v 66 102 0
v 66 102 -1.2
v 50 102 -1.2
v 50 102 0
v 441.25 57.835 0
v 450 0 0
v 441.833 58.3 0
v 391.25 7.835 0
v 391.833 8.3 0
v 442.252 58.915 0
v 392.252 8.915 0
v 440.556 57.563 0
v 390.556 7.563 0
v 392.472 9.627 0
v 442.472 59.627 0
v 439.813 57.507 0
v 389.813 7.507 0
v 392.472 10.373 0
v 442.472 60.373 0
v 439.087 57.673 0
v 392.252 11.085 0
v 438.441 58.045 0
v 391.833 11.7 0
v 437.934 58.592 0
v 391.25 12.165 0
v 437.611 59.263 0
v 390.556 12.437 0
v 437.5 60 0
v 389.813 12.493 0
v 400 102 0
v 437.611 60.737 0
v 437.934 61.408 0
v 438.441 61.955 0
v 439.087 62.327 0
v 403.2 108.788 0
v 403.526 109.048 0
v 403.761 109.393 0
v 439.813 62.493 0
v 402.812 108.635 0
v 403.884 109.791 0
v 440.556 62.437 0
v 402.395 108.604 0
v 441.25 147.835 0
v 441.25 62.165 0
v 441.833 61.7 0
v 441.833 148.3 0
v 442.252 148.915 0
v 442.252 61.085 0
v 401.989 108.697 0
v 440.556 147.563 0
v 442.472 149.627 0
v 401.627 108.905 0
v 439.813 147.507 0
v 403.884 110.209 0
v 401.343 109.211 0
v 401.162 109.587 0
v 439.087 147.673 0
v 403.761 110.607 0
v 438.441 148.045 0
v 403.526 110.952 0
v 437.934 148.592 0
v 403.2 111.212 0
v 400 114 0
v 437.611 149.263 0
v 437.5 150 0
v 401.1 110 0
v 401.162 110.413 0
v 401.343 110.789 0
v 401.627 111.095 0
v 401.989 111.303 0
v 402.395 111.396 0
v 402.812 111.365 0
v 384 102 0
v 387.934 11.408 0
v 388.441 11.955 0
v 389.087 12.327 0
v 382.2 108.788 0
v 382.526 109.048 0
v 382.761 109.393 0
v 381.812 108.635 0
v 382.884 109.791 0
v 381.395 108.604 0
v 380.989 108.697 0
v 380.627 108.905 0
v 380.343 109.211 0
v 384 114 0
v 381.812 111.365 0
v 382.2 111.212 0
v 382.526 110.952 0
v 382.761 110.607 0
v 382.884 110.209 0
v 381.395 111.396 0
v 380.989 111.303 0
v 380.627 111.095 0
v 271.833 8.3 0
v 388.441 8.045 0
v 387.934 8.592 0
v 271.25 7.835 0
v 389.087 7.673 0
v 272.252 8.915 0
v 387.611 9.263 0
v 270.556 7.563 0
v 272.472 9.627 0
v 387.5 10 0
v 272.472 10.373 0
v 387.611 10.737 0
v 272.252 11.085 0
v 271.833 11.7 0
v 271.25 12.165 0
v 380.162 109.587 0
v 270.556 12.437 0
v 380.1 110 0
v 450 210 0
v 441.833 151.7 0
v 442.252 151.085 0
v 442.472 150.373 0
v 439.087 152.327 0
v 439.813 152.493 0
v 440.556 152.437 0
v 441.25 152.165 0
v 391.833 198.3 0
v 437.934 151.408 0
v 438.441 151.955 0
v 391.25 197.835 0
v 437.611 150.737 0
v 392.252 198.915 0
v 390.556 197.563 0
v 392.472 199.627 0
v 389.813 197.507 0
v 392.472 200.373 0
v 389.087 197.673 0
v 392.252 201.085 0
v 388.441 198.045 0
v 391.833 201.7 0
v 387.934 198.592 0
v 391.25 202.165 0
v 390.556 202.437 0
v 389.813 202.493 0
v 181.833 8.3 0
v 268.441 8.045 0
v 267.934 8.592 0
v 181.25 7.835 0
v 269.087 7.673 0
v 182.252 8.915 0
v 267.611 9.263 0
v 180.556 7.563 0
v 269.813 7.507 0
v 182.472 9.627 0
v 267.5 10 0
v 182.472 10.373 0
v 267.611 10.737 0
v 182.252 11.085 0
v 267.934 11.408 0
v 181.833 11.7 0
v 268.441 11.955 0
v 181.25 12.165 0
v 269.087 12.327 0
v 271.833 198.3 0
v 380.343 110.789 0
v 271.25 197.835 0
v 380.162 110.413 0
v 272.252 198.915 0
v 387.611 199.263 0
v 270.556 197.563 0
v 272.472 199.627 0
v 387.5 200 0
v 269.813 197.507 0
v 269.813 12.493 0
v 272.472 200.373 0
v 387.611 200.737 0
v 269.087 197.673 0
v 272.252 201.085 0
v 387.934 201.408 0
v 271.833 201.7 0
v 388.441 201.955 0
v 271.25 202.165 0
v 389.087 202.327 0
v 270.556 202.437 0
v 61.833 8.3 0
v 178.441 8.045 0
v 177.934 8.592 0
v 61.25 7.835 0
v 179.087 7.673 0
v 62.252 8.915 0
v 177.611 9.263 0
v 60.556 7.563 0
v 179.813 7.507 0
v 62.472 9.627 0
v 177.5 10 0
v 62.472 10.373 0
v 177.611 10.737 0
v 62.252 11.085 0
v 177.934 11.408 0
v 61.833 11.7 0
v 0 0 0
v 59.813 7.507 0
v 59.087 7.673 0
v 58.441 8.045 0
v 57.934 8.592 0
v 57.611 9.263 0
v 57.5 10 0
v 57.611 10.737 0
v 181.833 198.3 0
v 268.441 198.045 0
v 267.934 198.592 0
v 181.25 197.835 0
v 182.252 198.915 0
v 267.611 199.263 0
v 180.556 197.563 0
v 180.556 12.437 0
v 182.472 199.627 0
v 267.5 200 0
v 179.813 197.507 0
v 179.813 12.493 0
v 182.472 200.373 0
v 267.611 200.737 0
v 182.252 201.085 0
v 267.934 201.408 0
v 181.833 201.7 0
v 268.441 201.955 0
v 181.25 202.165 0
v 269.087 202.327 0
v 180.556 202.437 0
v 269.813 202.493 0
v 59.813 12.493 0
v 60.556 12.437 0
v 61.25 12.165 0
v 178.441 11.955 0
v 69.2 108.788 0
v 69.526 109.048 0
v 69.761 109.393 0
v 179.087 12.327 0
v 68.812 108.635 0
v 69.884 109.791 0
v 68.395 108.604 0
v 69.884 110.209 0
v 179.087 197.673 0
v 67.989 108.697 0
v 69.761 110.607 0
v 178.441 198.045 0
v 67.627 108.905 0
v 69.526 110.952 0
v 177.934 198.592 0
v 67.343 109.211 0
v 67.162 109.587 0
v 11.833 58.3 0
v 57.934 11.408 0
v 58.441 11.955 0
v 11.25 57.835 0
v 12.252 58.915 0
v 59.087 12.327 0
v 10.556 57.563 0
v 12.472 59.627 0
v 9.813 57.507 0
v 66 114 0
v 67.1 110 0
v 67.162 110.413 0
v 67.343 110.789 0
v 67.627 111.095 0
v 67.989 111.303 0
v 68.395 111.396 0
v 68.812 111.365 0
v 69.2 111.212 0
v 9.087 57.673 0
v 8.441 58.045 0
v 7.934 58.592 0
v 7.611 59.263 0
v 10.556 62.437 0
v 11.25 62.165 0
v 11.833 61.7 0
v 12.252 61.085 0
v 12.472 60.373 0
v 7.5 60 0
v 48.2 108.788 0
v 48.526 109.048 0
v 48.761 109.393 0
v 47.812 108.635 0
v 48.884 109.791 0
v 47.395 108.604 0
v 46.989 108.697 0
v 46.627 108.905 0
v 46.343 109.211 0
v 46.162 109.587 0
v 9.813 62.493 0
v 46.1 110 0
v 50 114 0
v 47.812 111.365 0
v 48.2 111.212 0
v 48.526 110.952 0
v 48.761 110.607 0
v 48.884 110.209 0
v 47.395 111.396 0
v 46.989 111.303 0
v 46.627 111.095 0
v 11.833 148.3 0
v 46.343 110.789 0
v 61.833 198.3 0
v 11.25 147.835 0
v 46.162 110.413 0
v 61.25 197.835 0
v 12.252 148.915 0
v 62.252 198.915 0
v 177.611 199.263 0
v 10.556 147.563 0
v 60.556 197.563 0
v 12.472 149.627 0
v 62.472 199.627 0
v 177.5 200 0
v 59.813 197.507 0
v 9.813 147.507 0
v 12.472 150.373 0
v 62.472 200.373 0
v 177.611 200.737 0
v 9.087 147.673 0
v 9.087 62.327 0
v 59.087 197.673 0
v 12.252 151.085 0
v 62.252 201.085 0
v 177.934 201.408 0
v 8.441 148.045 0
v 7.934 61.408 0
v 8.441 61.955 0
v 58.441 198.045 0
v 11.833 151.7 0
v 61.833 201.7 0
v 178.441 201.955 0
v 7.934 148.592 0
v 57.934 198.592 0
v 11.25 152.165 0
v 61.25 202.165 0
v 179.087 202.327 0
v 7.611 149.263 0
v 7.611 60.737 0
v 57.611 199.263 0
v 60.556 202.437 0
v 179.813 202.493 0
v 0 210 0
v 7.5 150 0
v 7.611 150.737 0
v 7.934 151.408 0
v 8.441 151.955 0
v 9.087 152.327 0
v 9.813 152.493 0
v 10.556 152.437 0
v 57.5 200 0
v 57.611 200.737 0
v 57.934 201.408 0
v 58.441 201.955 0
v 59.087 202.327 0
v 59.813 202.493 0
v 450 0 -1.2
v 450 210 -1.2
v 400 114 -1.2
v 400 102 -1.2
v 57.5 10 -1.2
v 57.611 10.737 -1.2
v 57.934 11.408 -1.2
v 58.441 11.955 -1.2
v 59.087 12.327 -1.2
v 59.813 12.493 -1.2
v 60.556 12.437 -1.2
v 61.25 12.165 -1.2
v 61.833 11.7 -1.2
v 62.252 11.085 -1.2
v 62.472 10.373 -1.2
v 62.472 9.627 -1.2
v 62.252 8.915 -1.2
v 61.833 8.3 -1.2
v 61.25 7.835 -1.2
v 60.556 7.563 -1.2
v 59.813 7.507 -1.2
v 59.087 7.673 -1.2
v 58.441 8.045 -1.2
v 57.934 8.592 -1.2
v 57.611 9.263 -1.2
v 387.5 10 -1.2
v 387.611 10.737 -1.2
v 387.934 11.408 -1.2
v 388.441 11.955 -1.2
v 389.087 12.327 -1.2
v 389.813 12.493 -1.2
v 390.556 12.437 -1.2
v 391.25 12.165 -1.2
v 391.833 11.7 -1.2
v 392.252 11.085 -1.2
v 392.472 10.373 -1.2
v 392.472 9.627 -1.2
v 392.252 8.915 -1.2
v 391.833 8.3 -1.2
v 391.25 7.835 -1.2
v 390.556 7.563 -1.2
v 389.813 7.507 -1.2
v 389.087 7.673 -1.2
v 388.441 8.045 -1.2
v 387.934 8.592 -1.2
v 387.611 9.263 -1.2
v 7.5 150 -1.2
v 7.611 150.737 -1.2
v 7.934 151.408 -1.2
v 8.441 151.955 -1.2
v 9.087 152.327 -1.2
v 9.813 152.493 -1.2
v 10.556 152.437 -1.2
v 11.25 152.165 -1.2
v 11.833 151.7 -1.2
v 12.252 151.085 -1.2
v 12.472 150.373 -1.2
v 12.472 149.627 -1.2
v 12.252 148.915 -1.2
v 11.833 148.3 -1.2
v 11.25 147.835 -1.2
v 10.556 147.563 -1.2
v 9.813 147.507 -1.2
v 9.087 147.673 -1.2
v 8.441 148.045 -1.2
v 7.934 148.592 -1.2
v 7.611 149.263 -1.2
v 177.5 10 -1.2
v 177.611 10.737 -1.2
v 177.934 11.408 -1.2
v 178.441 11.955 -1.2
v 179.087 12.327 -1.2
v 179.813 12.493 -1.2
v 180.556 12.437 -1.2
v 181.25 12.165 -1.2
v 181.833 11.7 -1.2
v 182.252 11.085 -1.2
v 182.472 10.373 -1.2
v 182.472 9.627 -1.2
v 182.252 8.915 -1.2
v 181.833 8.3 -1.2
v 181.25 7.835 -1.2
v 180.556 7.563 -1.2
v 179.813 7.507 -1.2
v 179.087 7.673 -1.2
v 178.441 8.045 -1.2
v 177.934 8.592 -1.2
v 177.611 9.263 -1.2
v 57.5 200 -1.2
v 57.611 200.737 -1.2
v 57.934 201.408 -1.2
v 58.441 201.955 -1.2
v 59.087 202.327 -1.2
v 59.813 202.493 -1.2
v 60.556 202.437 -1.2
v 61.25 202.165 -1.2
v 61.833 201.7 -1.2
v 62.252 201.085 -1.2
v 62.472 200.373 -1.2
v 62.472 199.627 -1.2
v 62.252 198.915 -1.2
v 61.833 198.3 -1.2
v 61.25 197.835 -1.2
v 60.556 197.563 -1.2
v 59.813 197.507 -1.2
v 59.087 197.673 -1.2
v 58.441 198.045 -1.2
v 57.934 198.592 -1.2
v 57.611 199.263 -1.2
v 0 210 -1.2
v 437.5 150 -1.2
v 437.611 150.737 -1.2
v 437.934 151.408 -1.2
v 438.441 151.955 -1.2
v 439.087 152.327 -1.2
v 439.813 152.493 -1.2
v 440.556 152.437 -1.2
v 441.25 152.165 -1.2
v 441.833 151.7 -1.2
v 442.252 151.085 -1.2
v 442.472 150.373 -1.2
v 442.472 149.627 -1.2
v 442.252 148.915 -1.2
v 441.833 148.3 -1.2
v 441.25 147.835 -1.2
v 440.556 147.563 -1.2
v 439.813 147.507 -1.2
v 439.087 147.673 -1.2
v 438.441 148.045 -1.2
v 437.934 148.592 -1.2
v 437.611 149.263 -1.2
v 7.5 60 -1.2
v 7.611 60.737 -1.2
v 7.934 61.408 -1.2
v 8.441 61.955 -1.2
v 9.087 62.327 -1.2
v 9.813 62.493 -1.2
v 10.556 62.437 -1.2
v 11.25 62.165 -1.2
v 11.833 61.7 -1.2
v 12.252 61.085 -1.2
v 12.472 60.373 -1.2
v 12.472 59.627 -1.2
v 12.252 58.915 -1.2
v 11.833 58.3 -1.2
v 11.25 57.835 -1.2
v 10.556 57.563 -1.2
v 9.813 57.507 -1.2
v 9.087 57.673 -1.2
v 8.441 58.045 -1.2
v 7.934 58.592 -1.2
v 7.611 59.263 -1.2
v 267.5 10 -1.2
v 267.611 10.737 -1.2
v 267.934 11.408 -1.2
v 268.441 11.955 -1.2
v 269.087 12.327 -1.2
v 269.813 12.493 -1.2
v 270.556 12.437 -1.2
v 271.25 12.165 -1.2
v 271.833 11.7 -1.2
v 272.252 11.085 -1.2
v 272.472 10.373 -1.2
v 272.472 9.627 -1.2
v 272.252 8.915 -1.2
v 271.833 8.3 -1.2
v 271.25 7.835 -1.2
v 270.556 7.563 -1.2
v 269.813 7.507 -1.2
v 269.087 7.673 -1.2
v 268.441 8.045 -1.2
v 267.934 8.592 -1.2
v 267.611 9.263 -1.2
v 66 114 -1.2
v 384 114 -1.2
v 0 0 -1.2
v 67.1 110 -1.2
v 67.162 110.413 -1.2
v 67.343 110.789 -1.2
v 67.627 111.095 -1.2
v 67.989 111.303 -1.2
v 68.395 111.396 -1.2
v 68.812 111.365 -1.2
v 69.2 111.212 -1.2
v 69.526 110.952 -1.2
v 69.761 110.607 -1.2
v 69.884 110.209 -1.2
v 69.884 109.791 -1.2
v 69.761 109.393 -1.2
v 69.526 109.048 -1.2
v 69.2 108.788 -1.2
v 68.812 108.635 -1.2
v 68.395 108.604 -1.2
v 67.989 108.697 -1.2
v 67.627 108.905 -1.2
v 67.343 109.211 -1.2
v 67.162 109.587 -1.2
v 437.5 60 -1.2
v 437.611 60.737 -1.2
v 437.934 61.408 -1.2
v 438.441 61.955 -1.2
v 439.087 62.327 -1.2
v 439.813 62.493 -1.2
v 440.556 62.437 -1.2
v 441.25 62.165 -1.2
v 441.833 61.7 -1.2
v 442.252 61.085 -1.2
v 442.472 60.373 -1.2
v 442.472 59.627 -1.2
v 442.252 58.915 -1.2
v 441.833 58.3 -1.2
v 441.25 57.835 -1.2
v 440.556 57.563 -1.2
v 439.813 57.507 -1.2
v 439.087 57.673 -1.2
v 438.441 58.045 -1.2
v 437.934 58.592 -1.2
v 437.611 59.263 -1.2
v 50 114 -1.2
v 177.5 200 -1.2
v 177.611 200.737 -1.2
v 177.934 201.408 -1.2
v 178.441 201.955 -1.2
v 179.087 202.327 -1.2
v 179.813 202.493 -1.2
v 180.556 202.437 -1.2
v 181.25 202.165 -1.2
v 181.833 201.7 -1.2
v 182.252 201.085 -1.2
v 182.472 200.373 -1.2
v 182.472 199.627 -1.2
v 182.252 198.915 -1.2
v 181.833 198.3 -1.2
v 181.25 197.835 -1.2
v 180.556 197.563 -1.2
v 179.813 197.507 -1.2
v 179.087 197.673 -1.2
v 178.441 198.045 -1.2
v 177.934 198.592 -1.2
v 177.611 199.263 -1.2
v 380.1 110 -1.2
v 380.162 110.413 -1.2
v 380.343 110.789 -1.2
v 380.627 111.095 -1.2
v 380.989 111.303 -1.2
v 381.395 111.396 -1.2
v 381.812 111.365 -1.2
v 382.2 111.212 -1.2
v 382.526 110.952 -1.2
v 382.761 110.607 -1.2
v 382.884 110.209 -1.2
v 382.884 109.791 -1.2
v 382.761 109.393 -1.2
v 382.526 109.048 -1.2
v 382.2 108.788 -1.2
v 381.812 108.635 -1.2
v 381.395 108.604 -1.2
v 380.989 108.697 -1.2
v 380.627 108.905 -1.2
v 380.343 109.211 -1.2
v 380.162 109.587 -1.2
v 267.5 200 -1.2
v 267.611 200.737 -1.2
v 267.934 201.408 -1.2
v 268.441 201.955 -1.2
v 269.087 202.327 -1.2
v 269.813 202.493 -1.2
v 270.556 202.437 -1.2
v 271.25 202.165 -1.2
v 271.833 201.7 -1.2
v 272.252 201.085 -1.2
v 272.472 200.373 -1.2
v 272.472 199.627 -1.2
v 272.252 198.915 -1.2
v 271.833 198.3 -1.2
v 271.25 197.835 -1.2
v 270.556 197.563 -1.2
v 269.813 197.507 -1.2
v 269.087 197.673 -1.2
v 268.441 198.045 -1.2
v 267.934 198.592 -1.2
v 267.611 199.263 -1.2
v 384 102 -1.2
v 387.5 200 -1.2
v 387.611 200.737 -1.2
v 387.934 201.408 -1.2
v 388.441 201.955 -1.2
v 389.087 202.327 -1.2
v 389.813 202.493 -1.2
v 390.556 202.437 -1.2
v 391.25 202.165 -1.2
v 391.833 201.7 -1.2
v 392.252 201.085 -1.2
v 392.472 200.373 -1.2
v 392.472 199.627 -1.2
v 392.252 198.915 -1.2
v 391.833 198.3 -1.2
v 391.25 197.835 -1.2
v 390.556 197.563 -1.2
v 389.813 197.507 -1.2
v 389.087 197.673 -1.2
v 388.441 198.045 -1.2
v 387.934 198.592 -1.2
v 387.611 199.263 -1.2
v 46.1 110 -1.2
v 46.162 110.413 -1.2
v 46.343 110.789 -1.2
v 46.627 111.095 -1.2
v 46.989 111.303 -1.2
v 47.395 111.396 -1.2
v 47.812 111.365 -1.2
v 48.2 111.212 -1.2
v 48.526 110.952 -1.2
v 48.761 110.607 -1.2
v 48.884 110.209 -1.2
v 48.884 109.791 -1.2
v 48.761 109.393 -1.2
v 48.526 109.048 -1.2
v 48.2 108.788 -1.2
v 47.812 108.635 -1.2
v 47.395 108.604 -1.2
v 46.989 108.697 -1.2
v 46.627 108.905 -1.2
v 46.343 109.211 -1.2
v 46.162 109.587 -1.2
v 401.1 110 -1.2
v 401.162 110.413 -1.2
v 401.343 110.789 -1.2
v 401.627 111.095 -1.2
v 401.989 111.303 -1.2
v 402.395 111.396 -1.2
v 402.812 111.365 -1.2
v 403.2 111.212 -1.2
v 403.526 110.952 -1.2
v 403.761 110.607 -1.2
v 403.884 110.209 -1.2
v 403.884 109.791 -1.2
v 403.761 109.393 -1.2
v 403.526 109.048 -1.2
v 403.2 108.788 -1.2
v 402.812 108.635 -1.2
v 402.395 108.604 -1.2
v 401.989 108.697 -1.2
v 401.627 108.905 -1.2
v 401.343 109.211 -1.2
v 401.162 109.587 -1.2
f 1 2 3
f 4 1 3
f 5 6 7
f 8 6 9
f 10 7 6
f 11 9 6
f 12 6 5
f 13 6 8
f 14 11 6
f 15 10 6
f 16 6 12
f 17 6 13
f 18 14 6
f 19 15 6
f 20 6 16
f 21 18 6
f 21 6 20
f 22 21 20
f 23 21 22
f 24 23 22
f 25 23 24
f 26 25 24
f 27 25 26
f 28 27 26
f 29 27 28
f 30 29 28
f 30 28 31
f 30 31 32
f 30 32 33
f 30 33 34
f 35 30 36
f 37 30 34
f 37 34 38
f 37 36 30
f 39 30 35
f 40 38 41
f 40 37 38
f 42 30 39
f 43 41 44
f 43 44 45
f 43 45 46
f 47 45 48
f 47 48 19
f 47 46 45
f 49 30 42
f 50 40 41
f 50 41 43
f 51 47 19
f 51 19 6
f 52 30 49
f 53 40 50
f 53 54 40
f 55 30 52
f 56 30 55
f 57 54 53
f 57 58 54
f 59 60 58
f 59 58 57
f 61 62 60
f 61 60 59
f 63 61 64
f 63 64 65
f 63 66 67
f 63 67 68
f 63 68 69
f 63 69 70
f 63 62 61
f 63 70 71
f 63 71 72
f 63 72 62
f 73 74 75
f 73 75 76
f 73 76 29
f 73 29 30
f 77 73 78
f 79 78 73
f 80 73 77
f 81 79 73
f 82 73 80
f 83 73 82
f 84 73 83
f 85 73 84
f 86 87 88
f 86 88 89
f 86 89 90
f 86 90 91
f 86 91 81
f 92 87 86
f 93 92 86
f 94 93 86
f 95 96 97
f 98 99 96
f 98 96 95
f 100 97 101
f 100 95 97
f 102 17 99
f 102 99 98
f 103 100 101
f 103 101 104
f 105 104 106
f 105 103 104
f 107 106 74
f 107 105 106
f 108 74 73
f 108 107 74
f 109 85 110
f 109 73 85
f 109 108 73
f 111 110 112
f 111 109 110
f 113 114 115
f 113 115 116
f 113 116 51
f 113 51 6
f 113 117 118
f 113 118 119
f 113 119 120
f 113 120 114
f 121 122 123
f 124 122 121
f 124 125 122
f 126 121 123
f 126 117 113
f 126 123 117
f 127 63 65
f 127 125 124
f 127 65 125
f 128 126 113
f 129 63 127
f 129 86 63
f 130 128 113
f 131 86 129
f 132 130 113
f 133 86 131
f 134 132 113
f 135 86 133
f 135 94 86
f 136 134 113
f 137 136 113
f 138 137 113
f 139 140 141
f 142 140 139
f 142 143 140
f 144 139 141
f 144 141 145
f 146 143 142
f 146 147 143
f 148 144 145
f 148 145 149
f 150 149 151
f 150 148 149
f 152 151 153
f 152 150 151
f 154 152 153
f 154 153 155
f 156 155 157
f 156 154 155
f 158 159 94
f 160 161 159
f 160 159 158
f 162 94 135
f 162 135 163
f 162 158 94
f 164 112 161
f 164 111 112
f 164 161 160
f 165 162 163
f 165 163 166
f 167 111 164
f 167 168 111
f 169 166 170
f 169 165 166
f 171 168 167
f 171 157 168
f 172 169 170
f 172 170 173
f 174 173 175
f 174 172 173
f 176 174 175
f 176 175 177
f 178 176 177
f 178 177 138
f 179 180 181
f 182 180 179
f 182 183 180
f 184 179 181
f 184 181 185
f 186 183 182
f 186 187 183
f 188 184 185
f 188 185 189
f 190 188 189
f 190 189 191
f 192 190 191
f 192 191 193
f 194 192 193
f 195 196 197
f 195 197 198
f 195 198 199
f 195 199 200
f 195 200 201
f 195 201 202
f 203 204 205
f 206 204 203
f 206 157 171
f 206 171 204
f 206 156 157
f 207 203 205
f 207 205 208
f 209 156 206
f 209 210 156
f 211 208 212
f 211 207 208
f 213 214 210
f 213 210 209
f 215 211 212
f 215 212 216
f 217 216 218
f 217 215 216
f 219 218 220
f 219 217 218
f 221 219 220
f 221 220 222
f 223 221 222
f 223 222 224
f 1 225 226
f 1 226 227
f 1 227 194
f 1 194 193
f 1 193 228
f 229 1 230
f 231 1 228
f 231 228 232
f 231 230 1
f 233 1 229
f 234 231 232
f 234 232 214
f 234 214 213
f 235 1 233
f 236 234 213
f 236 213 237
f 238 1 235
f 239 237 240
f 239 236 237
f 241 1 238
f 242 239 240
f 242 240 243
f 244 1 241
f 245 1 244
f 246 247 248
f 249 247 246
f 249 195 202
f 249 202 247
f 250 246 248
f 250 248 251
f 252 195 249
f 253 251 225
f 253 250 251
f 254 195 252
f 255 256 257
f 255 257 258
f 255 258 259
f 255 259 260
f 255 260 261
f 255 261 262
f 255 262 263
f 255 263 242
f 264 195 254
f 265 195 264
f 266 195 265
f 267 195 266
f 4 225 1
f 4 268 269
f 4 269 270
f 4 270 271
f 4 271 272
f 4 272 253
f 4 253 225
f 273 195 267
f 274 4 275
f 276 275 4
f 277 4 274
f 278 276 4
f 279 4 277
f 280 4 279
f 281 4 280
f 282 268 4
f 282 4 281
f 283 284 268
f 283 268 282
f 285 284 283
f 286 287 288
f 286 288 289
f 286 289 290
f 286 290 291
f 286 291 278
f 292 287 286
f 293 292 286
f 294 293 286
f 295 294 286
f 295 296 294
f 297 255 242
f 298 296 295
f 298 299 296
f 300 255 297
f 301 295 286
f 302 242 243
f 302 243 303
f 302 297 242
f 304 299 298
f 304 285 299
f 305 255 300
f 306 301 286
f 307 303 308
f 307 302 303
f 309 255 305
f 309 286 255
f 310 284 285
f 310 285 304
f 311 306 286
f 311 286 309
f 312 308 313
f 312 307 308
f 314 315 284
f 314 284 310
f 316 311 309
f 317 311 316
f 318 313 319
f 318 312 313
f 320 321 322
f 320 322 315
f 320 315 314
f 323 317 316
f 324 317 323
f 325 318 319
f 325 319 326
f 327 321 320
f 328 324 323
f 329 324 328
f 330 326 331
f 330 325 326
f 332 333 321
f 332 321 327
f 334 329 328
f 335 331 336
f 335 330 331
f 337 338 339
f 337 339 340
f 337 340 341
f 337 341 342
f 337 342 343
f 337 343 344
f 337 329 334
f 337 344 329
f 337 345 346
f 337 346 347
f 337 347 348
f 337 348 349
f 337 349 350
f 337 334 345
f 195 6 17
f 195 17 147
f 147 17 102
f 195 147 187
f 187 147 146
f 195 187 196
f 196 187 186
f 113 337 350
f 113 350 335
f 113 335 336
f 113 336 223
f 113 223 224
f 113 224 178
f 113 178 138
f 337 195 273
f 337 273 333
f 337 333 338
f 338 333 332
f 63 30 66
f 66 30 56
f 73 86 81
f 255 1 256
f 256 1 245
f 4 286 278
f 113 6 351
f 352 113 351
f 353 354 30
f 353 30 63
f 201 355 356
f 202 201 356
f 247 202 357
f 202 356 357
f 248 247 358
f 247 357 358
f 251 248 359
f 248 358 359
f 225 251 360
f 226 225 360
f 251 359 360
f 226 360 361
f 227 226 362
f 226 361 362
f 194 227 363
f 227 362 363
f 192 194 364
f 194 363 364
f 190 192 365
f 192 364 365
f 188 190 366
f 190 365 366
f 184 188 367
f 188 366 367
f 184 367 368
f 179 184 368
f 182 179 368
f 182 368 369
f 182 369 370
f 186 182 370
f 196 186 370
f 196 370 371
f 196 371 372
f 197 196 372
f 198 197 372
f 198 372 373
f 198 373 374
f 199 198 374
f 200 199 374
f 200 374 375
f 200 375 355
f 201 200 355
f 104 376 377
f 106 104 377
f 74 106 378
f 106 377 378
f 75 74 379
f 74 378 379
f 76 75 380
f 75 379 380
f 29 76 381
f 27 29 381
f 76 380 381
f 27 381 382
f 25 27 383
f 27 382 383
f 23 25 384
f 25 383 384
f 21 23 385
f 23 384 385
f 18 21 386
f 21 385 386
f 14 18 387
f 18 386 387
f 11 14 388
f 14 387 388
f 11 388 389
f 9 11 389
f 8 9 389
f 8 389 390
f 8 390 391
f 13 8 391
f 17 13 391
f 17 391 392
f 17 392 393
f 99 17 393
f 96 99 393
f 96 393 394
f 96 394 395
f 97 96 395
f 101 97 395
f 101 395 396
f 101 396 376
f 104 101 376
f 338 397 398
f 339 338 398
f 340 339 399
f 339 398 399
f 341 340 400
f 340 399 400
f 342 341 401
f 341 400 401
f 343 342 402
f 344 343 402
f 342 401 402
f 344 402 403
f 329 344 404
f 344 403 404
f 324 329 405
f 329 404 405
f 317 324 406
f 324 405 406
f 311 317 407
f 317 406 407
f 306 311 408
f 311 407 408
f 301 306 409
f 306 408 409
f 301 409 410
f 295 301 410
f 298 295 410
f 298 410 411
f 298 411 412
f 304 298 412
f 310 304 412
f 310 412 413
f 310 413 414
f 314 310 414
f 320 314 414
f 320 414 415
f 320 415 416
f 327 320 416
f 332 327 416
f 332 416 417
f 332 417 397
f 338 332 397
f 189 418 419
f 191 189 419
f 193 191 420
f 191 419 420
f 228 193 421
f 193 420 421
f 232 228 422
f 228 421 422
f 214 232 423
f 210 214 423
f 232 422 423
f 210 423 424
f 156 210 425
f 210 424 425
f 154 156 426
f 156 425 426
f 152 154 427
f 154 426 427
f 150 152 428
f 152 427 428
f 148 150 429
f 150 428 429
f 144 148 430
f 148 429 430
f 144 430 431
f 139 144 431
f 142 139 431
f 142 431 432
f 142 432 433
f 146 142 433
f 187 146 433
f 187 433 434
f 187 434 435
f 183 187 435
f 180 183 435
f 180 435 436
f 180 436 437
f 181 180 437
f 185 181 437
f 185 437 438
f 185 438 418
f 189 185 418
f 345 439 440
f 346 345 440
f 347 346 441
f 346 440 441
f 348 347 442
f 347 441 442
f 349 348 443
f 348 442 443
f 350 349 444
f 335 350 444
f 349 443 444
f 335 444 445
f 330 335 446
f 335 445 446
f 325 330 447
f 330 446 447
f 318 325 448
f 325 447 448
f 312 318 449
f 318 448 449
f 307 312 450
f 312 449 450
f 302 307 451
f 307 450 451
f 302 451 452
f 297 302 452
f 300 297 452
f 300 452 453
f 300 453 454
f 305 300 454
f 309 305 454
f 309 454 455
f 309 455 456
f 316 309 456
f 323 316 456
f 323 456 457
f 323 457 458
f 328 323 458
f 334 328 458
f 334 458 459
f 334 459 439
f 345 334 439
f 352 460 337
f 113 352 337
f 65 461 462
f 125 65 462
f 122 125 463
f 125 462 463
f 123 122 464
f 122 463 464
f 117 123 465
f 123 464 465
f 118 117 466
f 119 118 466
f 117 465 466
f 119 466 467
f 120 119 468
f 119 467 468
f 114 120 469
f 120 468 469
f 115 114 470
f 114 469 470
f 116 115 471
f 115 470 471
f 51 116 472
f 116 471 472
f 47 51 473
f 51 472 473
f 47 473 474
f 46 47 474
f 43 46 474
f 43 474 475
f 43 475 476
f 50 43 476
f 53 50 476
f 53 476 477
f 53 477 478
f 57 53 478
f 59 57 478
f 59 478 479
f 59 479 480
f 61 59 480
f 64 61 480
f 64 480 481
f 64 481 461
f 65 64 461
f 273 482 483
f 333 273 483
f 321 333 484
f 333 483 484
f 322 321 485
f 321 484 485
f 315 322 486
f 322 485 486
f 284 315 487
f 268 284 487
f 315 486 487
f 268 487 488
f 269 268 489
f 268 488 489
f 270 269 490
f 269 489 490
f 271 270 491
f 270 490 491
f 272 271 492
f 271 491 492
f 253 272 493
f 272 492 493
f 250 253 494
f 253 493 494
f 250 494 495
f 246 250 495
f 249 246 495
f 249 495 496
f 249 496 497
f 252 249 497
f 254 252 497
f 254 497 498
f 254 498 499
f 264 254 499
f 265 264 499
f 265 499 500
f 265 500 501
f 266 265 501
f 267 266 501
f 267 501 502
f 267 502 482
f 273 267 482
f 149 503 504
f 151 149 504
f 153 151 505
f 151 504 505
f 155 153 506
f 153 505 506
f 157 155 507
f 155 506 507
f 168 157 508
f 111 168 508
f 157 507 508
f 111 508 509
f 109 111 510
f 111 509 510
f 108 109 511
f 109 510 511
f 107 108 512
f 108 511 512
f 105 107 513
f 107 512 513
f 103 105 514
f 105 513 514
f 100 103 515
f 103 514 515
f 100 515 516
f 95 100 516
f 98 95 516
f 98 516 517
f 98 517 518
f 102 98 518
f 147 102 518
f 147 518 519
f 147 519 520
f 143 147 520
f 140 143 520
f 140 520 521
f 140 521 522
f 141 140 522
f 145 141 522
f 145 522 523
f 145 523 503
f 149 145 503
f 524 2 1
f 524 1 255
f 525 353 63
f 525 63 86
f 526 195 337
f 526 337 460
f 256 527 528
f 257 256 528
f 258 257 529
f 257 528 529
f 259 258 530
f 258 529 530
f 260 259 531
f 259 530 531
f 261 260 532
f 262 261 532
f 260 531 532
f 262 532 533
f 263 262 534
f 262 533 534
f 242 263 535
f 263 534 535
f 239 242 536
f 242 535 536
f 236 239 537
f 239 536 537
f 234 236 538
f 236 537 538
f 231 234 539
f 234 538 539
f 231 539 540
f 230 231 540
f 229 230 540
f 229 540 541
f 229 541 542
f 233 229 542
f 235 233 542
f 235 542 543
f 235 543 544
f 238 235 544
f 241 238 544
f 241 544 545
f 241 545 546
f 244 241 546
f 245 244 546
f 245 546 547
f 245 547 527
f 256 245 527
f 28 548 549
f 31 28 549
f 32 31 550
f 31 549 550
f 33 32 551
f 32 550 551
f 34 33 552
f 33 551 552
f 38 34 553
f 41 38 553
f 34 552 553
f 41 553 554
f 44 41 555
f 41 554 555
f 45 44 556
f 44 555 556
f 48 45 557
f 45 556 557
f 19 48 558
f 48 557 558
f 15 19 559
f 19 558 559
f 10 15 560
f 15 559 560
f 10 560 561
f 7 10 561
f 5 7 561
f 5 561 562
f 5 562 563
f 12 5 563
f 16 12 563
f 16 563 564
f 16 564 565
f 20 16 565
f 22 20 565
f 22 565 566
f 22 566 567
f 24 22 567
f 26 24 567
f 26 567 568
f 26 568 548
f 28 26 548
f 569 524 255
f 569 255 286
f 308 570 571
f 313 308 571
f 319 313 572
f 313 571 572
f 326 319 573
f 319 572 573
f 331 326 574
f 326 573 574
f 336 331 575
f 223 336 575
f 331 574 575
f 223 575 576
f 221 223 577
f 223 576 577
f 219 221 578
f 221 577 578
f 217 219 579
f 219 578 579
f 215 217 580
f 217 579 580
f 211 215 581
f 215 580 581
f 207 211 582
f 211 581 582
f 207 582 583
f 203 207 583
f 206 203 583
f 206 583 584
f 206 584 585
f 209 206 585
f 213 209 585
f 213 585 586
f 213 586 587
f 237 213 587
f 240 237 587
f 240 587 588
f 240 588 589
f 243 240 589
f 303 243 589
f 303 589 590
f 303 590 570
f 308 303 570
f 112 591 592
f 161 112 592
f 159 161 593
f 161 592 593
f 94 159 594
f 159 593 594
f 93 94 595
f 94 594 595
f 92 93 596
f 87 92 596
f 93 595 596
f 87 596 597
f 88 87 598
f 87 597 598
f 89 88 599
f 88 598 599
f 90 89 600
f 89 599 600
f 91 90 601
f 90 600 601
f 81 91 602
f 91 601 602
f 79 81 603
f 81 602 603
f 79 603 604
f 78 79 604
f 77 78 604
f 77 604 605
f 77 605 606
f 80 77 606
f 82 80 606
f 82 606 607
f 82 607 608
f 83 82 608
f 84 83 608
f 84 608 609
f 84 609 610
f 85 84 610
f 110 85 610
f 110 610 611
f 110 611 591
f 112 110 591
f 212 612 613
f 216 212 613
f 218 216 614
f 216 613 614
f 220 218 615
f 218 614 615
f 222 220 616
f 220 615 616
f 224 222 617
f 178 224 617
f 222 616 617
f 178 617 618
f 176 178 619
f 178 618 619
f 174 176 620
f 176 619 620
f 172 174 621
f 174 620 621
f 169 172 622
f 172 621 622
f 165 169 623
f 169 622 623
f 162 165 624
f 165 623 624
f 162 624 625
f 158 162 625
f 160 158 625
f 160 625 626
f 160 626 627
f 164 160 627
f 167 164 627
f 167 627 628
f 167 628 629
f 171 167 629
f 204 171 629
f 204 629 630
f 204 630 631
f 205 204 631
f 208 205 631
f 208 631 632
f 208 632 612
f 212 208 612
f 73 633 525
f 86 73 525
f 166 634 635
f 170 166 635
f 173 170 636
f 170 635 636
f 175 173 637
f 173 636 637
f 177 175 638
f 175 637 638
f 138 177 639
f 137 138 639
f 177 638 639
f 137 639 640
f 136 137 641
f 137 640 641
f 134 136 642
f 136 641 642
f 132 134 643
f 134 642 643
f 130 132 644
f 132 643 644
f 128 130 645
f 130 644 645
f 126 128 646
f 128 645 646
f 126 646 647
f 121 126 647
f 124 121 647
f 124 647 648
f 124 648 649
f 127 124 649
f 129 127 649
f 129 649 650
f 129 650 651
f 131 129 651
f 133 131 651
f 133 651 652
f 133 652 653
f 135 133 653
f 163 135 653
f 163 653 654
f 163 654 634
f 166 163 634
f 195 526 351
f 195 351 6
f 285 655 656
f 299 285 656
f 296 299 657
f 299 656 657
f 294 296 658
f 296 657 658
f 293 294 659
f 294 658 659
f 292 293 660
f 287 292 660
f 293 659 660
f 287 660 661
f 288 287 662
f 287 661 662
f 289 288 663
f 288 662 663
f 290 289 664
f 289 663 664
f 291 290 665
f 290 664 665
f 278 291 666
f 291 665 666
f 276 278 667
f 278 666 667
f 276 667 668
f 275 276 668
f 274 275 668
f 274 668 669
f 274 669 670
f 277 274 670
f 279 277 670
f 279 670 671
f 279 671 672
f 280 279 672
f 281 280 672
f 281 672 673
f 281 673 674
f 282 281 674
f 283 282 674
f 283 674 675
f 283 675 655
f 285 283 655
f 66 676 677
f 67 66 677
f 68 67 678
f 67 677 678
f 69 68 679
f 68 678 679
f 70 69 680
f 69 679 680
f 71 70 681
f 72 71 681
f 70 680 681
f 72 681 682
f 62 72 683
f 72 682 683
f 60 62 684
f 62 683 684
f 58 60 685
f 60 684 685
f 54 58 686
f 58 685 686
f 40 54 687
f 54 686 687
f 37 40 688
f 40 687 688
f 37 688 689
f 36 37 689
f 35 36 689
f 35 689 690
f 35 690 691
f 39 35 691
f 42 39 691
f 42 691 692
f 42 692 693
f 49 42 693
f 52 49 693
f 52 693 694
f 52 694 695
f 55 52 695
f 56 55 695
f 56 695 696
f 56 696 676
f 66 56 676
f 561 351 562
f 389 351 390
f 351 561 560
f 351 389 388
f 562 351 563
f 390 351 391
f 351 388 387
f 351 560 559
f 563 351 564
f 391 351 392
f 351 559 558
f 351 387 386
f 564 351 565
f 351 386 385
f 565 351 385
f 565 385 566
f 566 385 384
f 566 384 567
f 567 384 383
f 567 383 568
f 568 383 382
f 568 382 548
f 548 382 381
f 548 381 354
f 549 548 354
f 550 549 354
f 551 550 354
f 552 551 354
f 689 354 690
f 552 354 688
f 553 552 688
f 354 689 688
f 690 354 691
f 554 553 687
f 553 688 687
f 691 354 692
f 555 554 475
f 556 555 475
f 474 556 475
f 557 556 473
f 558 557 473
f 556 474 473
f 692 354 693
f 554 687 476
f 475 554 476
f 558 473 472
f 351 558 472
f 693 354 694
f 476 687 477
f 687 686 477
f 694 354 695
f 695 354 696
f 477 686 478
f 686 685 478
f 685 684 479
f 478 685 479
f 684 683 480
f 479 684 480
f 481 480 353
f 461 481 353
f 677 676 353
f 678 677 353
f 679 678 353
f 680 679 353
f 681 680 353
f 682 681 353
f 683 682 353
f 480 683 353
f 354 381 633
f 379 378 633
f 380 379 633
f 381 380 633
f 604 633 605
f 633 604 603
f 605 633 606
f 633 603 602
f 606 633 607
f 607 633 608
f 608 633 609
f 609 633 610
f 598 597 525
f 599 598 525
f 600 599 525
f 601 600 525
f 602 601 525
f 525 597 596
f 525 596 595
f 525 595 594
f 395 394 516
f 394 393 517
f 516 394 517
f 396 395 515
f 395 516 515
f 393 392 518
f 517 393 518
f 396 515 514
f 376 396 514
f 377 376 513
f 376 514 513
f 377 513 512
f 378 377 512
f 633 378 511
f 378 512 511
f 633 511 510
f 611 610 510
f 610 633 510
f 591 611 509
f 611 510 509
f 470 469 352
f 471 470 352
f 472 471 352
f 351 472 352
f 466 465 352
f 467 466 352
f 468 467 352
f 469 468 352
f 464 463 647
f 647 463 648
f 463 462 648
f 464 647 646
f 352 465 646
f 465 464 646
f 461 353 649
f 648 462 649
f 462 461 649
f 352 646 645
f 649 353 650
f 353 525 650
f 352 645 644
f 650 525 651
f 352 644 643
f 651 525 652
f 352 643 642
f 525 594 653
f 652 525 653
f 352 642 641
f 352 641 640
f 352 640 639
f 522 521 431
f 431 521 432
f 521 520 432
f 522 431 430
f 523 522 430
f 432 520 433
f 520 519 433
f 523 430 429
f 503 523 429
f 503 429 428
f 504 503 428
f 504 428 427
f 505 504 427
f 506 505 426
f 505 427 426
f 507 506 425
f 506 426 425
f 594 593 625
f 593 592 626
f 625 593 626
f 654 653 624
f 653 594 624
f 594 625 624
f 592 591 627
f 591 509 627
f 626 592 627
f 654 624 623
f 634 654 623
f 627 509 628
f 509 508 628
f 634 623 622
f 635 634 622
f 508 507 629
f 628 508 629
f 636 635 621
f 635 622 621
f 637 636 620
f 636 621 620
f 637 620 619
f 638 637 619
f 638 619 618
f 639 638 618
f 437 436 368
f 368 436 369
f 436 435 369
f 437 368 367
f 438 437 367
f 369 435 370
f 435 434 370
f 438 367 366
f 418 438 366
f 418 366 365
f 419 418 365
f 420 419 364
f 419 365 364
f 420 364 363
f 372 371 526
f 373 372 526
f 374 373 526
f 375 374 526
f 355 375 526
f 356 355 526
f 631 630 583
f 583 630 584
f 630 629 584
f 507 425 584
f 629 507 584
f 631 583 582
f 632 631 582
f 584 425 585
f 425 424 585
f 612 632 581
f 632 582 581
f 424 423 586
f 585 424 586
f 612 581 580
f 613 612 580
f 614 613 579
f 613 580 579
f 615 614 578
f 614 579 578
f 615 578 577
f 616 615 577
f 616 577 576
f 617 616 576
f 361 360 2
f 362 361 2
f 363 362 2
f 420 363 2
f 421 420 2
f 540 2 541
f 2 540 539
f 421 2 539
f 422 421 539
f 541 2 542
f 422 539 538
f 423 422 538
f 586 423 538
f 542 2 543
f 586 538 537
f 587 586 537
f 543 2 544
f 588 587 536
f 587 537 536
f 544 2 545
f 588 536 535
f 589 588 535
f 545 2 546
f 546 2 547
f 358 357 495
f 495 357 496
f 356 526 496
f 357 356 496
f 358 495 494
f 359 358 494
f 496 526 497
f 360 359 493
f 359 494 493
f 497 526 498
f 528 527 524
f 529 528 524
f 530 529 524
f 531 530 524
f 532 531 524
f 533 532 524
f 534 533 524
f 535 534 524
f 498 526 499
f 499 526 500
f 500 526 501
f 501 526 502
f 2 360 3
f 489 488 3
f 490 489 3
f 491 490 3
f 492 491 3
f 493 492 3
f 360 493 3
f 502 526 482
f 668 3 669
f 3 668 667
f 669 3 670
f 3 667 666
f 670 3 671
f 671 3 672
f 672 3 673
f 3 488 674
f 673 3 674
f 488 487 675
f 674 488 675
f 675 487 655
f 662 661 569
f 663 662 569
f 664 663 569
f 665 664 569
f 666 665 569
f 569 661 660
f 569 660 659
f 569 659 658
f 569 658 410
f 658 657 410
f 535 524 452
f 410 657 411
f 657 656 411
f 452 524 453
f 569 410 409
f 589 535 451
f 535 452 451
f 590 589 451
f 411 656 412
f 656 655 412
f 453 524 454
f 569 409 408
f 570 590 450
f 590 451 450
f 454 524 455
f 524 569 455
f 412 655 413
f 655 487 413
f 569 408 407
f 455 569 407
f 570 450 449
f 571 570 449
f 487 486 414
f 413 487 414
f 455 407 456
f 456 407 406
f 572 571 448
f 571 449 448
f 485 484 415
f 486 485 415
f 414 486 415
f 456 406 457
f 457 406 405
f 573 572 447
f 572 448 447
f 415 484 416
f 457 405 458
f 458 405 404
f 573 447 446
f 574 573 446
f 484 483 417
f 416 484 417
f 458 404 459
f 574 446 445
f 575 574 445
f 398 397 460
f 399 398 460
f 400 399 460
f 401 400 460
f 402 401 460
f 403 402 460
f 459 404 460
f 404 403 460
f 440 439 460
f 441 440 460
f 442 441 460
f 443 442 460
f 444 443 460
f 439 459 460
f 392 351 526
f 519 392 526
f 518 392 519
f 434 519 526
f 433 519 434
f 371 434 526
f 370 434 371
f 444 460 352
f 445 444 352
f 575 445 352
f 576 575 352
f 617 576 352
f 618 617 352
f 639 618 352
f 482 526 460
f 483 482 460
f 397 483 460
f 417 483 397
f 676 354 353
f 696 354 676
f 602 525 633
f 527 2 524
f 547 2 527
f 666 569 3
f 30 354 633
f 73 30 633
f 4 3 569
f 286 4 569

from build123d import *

# Parameters (mm, degrees)
SURFACE_EXTRUDE1_1_DEPTH = 450
THICKEN15_T2             = 1.2
SKETCH2_W                = 16
SKETCH2_H                = 12
CUT_EXTRUDE1_DEPTH       = 10
SKETCH3_R                = 1.4
CUT_EXTRUDE2_DEPTH       = 10
SKETCH4_R                = 2.5
CUT_EXTRUDE5_DEPTH       = 10


with BuildPart() as body_1:
    # Surface-Extrude1: a surface, the sketch's curves swept straight by 450 mm
    with BuildLine(Plane(origin=(0, 0, 0), x_dir=(0, 0, -1), z_dir=(1, 0, 0)), mode=Mode.PRIVATE) as surface_extrude1_1_path:
        Line((0, 0), (0, 210))
    surface_extrude1_1 = Shell.extrude(surface_extrude1_1_path.wire(), (1 * SURFACE_EXTRUDE1_1_DEPTH, 0 * SURFACE_EXTRUDE1_1_DEPTH, 0 * SURFACE_EXTRUDE1_1_DEPTH))
    add(Solid.thicken(surface_extrude1_1, -THICKEN15_T2))

    # Sketch2 → Cut-Extrude1 (cut)
    with BuildSketch(Plane(origin=(0, 0, -1.2), x_dir=(-1, 0, 0), z_dir=(0, 0, -1))):
        with Locations((-392, 108)):
            Rectangle(SKETCH2_W, SKETCH2_H)
        with Locations((-58, 108)):
            Rectangle(SKETCH2_W, SKETCH2_H)
    extrude(amount=-CUT_EXTRUDE1_DEPTH, mode=Mode.SUBTRACT)

    # Sketch3 → Cut-Extrude2 (cut)
    with BuildSketch(Plane(origin=(0, 0, -1.2), x_dir=(-1, 0, 0), z_dir=(0, 0, -1))):
        with Locations((-402.5, 110)):
            Circle(SKETCH3_R)
        with Locations((-381.5, 110)):
            Circle(SKETCH3_R)
        with Locations((-68.5, 110)):
            Circle(SKETCH3_R)
        with Locations((-47.5, 110)):
            Circle(SKETCH3_R)
    extrude(amount=-CUT_EXTRUDE2_DEPTH, mode=Mode.SUBTRACT)

    # Sketch4 → Cut-Extrude5 (cut)
    with BuildSketch(Plane(origin=(0, 0, -1.2), x_dir=(-1, 0, 0), z_dir=(0, 0, -1))):
        with Locations((-390, 200)):
            Circle(SKETCH4_R)
        with Locations((-270, 200)):
            Circle(SKETCH4_R)
        with Locations((-440, 150)):
            Circle(SKETCH4_R)
        with Locations((-180, 200)):
            Circle(SKETCH4_R)
        with Locations((-60, 200)):
            Circle(SKETCH4_R)
        with Locations((-10, 150)):
            Circle(SKETCH4_R)
        with Locations((-10, 60)):
            Circle(SKETCH4_R)
        with Locations((-60, 10)):
            Circle(SKETCH4_R)
        with Locations((-180, 10)):
            Circle(SKETCH4_R)
        with Locations((-270, 10)):
            Circle(SKETCH4_R)
        with Locations((-390, 10)):
            Circle(SKETCH4_R)
        with Locations((-440, 60)):
            Circle(SKETCH4_R)
    extrude(amount=-CUT_EXTRUDE5_DEPTH, mode=Mode.SUBTRACT)


solid = body_1.part
